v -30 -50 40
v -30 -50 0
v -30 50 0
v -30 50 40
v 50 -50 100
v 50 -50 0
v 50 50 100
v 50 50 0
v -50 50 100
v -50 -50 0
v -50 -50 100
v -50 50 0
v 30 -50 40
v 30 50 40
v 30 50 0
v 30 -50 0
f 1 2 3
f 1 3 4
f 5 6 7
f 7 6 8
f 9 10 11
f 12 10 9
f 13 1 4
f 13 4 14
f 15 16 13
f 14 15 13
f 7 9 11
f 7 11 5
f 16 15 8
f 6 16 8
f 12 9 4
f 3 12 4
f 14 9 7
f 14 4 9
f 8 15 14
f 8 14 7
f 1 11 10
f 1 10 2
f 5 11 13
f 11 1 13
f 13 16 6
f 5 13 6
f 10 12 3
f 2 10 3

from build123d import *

# Parameters (mm, degrees)
F0_W     = 100
F0_H     = 100
F1_DEPTH = 100
F2_W     = 100
F2_H     = 64.8081071675
F3_DEPTH = 40
F4_W     = 60
F4_H     = 40
F5_DEPTH = 100.001
F6_DEPTH = 40


with BuildPart() as f1:
    # F0 (on Top) → F1 (new body)
    with BuildSketch(Plane.XY):
        Rectangle(F0_W, F0_H)
    extrude(amount=F1_DEPTH)

    # F2 (on face) → F3 (cut)
    with BuildSketch(Plane.XY.offset(100)):
        with Locations((0, -17.5959464163)):
            Rectangle(F2_W, F2_H)
    extrude(amount=-F3_DEPTH, mode=Mode.SUBTRACT)

    # F4 (on face) → F5 (cut, through all)
    with BuildSketch(Plane.XZ.offset(50)):
        with Locations((0, 20)):
            Rectangle(F4_W, F4_H)
    extrude(amount=-F5_DEPTH, mode=Mode.SUBTRACT)

    # F6 (add): a face of the model
    f6_faces = [f1.faces().sort_by_distance(p)[0] for p in [
        (0, -17.5959464163, 60),
    ]]
    extrude(f6_faces, amount=F6_DEPTH)


solid = f1.part
